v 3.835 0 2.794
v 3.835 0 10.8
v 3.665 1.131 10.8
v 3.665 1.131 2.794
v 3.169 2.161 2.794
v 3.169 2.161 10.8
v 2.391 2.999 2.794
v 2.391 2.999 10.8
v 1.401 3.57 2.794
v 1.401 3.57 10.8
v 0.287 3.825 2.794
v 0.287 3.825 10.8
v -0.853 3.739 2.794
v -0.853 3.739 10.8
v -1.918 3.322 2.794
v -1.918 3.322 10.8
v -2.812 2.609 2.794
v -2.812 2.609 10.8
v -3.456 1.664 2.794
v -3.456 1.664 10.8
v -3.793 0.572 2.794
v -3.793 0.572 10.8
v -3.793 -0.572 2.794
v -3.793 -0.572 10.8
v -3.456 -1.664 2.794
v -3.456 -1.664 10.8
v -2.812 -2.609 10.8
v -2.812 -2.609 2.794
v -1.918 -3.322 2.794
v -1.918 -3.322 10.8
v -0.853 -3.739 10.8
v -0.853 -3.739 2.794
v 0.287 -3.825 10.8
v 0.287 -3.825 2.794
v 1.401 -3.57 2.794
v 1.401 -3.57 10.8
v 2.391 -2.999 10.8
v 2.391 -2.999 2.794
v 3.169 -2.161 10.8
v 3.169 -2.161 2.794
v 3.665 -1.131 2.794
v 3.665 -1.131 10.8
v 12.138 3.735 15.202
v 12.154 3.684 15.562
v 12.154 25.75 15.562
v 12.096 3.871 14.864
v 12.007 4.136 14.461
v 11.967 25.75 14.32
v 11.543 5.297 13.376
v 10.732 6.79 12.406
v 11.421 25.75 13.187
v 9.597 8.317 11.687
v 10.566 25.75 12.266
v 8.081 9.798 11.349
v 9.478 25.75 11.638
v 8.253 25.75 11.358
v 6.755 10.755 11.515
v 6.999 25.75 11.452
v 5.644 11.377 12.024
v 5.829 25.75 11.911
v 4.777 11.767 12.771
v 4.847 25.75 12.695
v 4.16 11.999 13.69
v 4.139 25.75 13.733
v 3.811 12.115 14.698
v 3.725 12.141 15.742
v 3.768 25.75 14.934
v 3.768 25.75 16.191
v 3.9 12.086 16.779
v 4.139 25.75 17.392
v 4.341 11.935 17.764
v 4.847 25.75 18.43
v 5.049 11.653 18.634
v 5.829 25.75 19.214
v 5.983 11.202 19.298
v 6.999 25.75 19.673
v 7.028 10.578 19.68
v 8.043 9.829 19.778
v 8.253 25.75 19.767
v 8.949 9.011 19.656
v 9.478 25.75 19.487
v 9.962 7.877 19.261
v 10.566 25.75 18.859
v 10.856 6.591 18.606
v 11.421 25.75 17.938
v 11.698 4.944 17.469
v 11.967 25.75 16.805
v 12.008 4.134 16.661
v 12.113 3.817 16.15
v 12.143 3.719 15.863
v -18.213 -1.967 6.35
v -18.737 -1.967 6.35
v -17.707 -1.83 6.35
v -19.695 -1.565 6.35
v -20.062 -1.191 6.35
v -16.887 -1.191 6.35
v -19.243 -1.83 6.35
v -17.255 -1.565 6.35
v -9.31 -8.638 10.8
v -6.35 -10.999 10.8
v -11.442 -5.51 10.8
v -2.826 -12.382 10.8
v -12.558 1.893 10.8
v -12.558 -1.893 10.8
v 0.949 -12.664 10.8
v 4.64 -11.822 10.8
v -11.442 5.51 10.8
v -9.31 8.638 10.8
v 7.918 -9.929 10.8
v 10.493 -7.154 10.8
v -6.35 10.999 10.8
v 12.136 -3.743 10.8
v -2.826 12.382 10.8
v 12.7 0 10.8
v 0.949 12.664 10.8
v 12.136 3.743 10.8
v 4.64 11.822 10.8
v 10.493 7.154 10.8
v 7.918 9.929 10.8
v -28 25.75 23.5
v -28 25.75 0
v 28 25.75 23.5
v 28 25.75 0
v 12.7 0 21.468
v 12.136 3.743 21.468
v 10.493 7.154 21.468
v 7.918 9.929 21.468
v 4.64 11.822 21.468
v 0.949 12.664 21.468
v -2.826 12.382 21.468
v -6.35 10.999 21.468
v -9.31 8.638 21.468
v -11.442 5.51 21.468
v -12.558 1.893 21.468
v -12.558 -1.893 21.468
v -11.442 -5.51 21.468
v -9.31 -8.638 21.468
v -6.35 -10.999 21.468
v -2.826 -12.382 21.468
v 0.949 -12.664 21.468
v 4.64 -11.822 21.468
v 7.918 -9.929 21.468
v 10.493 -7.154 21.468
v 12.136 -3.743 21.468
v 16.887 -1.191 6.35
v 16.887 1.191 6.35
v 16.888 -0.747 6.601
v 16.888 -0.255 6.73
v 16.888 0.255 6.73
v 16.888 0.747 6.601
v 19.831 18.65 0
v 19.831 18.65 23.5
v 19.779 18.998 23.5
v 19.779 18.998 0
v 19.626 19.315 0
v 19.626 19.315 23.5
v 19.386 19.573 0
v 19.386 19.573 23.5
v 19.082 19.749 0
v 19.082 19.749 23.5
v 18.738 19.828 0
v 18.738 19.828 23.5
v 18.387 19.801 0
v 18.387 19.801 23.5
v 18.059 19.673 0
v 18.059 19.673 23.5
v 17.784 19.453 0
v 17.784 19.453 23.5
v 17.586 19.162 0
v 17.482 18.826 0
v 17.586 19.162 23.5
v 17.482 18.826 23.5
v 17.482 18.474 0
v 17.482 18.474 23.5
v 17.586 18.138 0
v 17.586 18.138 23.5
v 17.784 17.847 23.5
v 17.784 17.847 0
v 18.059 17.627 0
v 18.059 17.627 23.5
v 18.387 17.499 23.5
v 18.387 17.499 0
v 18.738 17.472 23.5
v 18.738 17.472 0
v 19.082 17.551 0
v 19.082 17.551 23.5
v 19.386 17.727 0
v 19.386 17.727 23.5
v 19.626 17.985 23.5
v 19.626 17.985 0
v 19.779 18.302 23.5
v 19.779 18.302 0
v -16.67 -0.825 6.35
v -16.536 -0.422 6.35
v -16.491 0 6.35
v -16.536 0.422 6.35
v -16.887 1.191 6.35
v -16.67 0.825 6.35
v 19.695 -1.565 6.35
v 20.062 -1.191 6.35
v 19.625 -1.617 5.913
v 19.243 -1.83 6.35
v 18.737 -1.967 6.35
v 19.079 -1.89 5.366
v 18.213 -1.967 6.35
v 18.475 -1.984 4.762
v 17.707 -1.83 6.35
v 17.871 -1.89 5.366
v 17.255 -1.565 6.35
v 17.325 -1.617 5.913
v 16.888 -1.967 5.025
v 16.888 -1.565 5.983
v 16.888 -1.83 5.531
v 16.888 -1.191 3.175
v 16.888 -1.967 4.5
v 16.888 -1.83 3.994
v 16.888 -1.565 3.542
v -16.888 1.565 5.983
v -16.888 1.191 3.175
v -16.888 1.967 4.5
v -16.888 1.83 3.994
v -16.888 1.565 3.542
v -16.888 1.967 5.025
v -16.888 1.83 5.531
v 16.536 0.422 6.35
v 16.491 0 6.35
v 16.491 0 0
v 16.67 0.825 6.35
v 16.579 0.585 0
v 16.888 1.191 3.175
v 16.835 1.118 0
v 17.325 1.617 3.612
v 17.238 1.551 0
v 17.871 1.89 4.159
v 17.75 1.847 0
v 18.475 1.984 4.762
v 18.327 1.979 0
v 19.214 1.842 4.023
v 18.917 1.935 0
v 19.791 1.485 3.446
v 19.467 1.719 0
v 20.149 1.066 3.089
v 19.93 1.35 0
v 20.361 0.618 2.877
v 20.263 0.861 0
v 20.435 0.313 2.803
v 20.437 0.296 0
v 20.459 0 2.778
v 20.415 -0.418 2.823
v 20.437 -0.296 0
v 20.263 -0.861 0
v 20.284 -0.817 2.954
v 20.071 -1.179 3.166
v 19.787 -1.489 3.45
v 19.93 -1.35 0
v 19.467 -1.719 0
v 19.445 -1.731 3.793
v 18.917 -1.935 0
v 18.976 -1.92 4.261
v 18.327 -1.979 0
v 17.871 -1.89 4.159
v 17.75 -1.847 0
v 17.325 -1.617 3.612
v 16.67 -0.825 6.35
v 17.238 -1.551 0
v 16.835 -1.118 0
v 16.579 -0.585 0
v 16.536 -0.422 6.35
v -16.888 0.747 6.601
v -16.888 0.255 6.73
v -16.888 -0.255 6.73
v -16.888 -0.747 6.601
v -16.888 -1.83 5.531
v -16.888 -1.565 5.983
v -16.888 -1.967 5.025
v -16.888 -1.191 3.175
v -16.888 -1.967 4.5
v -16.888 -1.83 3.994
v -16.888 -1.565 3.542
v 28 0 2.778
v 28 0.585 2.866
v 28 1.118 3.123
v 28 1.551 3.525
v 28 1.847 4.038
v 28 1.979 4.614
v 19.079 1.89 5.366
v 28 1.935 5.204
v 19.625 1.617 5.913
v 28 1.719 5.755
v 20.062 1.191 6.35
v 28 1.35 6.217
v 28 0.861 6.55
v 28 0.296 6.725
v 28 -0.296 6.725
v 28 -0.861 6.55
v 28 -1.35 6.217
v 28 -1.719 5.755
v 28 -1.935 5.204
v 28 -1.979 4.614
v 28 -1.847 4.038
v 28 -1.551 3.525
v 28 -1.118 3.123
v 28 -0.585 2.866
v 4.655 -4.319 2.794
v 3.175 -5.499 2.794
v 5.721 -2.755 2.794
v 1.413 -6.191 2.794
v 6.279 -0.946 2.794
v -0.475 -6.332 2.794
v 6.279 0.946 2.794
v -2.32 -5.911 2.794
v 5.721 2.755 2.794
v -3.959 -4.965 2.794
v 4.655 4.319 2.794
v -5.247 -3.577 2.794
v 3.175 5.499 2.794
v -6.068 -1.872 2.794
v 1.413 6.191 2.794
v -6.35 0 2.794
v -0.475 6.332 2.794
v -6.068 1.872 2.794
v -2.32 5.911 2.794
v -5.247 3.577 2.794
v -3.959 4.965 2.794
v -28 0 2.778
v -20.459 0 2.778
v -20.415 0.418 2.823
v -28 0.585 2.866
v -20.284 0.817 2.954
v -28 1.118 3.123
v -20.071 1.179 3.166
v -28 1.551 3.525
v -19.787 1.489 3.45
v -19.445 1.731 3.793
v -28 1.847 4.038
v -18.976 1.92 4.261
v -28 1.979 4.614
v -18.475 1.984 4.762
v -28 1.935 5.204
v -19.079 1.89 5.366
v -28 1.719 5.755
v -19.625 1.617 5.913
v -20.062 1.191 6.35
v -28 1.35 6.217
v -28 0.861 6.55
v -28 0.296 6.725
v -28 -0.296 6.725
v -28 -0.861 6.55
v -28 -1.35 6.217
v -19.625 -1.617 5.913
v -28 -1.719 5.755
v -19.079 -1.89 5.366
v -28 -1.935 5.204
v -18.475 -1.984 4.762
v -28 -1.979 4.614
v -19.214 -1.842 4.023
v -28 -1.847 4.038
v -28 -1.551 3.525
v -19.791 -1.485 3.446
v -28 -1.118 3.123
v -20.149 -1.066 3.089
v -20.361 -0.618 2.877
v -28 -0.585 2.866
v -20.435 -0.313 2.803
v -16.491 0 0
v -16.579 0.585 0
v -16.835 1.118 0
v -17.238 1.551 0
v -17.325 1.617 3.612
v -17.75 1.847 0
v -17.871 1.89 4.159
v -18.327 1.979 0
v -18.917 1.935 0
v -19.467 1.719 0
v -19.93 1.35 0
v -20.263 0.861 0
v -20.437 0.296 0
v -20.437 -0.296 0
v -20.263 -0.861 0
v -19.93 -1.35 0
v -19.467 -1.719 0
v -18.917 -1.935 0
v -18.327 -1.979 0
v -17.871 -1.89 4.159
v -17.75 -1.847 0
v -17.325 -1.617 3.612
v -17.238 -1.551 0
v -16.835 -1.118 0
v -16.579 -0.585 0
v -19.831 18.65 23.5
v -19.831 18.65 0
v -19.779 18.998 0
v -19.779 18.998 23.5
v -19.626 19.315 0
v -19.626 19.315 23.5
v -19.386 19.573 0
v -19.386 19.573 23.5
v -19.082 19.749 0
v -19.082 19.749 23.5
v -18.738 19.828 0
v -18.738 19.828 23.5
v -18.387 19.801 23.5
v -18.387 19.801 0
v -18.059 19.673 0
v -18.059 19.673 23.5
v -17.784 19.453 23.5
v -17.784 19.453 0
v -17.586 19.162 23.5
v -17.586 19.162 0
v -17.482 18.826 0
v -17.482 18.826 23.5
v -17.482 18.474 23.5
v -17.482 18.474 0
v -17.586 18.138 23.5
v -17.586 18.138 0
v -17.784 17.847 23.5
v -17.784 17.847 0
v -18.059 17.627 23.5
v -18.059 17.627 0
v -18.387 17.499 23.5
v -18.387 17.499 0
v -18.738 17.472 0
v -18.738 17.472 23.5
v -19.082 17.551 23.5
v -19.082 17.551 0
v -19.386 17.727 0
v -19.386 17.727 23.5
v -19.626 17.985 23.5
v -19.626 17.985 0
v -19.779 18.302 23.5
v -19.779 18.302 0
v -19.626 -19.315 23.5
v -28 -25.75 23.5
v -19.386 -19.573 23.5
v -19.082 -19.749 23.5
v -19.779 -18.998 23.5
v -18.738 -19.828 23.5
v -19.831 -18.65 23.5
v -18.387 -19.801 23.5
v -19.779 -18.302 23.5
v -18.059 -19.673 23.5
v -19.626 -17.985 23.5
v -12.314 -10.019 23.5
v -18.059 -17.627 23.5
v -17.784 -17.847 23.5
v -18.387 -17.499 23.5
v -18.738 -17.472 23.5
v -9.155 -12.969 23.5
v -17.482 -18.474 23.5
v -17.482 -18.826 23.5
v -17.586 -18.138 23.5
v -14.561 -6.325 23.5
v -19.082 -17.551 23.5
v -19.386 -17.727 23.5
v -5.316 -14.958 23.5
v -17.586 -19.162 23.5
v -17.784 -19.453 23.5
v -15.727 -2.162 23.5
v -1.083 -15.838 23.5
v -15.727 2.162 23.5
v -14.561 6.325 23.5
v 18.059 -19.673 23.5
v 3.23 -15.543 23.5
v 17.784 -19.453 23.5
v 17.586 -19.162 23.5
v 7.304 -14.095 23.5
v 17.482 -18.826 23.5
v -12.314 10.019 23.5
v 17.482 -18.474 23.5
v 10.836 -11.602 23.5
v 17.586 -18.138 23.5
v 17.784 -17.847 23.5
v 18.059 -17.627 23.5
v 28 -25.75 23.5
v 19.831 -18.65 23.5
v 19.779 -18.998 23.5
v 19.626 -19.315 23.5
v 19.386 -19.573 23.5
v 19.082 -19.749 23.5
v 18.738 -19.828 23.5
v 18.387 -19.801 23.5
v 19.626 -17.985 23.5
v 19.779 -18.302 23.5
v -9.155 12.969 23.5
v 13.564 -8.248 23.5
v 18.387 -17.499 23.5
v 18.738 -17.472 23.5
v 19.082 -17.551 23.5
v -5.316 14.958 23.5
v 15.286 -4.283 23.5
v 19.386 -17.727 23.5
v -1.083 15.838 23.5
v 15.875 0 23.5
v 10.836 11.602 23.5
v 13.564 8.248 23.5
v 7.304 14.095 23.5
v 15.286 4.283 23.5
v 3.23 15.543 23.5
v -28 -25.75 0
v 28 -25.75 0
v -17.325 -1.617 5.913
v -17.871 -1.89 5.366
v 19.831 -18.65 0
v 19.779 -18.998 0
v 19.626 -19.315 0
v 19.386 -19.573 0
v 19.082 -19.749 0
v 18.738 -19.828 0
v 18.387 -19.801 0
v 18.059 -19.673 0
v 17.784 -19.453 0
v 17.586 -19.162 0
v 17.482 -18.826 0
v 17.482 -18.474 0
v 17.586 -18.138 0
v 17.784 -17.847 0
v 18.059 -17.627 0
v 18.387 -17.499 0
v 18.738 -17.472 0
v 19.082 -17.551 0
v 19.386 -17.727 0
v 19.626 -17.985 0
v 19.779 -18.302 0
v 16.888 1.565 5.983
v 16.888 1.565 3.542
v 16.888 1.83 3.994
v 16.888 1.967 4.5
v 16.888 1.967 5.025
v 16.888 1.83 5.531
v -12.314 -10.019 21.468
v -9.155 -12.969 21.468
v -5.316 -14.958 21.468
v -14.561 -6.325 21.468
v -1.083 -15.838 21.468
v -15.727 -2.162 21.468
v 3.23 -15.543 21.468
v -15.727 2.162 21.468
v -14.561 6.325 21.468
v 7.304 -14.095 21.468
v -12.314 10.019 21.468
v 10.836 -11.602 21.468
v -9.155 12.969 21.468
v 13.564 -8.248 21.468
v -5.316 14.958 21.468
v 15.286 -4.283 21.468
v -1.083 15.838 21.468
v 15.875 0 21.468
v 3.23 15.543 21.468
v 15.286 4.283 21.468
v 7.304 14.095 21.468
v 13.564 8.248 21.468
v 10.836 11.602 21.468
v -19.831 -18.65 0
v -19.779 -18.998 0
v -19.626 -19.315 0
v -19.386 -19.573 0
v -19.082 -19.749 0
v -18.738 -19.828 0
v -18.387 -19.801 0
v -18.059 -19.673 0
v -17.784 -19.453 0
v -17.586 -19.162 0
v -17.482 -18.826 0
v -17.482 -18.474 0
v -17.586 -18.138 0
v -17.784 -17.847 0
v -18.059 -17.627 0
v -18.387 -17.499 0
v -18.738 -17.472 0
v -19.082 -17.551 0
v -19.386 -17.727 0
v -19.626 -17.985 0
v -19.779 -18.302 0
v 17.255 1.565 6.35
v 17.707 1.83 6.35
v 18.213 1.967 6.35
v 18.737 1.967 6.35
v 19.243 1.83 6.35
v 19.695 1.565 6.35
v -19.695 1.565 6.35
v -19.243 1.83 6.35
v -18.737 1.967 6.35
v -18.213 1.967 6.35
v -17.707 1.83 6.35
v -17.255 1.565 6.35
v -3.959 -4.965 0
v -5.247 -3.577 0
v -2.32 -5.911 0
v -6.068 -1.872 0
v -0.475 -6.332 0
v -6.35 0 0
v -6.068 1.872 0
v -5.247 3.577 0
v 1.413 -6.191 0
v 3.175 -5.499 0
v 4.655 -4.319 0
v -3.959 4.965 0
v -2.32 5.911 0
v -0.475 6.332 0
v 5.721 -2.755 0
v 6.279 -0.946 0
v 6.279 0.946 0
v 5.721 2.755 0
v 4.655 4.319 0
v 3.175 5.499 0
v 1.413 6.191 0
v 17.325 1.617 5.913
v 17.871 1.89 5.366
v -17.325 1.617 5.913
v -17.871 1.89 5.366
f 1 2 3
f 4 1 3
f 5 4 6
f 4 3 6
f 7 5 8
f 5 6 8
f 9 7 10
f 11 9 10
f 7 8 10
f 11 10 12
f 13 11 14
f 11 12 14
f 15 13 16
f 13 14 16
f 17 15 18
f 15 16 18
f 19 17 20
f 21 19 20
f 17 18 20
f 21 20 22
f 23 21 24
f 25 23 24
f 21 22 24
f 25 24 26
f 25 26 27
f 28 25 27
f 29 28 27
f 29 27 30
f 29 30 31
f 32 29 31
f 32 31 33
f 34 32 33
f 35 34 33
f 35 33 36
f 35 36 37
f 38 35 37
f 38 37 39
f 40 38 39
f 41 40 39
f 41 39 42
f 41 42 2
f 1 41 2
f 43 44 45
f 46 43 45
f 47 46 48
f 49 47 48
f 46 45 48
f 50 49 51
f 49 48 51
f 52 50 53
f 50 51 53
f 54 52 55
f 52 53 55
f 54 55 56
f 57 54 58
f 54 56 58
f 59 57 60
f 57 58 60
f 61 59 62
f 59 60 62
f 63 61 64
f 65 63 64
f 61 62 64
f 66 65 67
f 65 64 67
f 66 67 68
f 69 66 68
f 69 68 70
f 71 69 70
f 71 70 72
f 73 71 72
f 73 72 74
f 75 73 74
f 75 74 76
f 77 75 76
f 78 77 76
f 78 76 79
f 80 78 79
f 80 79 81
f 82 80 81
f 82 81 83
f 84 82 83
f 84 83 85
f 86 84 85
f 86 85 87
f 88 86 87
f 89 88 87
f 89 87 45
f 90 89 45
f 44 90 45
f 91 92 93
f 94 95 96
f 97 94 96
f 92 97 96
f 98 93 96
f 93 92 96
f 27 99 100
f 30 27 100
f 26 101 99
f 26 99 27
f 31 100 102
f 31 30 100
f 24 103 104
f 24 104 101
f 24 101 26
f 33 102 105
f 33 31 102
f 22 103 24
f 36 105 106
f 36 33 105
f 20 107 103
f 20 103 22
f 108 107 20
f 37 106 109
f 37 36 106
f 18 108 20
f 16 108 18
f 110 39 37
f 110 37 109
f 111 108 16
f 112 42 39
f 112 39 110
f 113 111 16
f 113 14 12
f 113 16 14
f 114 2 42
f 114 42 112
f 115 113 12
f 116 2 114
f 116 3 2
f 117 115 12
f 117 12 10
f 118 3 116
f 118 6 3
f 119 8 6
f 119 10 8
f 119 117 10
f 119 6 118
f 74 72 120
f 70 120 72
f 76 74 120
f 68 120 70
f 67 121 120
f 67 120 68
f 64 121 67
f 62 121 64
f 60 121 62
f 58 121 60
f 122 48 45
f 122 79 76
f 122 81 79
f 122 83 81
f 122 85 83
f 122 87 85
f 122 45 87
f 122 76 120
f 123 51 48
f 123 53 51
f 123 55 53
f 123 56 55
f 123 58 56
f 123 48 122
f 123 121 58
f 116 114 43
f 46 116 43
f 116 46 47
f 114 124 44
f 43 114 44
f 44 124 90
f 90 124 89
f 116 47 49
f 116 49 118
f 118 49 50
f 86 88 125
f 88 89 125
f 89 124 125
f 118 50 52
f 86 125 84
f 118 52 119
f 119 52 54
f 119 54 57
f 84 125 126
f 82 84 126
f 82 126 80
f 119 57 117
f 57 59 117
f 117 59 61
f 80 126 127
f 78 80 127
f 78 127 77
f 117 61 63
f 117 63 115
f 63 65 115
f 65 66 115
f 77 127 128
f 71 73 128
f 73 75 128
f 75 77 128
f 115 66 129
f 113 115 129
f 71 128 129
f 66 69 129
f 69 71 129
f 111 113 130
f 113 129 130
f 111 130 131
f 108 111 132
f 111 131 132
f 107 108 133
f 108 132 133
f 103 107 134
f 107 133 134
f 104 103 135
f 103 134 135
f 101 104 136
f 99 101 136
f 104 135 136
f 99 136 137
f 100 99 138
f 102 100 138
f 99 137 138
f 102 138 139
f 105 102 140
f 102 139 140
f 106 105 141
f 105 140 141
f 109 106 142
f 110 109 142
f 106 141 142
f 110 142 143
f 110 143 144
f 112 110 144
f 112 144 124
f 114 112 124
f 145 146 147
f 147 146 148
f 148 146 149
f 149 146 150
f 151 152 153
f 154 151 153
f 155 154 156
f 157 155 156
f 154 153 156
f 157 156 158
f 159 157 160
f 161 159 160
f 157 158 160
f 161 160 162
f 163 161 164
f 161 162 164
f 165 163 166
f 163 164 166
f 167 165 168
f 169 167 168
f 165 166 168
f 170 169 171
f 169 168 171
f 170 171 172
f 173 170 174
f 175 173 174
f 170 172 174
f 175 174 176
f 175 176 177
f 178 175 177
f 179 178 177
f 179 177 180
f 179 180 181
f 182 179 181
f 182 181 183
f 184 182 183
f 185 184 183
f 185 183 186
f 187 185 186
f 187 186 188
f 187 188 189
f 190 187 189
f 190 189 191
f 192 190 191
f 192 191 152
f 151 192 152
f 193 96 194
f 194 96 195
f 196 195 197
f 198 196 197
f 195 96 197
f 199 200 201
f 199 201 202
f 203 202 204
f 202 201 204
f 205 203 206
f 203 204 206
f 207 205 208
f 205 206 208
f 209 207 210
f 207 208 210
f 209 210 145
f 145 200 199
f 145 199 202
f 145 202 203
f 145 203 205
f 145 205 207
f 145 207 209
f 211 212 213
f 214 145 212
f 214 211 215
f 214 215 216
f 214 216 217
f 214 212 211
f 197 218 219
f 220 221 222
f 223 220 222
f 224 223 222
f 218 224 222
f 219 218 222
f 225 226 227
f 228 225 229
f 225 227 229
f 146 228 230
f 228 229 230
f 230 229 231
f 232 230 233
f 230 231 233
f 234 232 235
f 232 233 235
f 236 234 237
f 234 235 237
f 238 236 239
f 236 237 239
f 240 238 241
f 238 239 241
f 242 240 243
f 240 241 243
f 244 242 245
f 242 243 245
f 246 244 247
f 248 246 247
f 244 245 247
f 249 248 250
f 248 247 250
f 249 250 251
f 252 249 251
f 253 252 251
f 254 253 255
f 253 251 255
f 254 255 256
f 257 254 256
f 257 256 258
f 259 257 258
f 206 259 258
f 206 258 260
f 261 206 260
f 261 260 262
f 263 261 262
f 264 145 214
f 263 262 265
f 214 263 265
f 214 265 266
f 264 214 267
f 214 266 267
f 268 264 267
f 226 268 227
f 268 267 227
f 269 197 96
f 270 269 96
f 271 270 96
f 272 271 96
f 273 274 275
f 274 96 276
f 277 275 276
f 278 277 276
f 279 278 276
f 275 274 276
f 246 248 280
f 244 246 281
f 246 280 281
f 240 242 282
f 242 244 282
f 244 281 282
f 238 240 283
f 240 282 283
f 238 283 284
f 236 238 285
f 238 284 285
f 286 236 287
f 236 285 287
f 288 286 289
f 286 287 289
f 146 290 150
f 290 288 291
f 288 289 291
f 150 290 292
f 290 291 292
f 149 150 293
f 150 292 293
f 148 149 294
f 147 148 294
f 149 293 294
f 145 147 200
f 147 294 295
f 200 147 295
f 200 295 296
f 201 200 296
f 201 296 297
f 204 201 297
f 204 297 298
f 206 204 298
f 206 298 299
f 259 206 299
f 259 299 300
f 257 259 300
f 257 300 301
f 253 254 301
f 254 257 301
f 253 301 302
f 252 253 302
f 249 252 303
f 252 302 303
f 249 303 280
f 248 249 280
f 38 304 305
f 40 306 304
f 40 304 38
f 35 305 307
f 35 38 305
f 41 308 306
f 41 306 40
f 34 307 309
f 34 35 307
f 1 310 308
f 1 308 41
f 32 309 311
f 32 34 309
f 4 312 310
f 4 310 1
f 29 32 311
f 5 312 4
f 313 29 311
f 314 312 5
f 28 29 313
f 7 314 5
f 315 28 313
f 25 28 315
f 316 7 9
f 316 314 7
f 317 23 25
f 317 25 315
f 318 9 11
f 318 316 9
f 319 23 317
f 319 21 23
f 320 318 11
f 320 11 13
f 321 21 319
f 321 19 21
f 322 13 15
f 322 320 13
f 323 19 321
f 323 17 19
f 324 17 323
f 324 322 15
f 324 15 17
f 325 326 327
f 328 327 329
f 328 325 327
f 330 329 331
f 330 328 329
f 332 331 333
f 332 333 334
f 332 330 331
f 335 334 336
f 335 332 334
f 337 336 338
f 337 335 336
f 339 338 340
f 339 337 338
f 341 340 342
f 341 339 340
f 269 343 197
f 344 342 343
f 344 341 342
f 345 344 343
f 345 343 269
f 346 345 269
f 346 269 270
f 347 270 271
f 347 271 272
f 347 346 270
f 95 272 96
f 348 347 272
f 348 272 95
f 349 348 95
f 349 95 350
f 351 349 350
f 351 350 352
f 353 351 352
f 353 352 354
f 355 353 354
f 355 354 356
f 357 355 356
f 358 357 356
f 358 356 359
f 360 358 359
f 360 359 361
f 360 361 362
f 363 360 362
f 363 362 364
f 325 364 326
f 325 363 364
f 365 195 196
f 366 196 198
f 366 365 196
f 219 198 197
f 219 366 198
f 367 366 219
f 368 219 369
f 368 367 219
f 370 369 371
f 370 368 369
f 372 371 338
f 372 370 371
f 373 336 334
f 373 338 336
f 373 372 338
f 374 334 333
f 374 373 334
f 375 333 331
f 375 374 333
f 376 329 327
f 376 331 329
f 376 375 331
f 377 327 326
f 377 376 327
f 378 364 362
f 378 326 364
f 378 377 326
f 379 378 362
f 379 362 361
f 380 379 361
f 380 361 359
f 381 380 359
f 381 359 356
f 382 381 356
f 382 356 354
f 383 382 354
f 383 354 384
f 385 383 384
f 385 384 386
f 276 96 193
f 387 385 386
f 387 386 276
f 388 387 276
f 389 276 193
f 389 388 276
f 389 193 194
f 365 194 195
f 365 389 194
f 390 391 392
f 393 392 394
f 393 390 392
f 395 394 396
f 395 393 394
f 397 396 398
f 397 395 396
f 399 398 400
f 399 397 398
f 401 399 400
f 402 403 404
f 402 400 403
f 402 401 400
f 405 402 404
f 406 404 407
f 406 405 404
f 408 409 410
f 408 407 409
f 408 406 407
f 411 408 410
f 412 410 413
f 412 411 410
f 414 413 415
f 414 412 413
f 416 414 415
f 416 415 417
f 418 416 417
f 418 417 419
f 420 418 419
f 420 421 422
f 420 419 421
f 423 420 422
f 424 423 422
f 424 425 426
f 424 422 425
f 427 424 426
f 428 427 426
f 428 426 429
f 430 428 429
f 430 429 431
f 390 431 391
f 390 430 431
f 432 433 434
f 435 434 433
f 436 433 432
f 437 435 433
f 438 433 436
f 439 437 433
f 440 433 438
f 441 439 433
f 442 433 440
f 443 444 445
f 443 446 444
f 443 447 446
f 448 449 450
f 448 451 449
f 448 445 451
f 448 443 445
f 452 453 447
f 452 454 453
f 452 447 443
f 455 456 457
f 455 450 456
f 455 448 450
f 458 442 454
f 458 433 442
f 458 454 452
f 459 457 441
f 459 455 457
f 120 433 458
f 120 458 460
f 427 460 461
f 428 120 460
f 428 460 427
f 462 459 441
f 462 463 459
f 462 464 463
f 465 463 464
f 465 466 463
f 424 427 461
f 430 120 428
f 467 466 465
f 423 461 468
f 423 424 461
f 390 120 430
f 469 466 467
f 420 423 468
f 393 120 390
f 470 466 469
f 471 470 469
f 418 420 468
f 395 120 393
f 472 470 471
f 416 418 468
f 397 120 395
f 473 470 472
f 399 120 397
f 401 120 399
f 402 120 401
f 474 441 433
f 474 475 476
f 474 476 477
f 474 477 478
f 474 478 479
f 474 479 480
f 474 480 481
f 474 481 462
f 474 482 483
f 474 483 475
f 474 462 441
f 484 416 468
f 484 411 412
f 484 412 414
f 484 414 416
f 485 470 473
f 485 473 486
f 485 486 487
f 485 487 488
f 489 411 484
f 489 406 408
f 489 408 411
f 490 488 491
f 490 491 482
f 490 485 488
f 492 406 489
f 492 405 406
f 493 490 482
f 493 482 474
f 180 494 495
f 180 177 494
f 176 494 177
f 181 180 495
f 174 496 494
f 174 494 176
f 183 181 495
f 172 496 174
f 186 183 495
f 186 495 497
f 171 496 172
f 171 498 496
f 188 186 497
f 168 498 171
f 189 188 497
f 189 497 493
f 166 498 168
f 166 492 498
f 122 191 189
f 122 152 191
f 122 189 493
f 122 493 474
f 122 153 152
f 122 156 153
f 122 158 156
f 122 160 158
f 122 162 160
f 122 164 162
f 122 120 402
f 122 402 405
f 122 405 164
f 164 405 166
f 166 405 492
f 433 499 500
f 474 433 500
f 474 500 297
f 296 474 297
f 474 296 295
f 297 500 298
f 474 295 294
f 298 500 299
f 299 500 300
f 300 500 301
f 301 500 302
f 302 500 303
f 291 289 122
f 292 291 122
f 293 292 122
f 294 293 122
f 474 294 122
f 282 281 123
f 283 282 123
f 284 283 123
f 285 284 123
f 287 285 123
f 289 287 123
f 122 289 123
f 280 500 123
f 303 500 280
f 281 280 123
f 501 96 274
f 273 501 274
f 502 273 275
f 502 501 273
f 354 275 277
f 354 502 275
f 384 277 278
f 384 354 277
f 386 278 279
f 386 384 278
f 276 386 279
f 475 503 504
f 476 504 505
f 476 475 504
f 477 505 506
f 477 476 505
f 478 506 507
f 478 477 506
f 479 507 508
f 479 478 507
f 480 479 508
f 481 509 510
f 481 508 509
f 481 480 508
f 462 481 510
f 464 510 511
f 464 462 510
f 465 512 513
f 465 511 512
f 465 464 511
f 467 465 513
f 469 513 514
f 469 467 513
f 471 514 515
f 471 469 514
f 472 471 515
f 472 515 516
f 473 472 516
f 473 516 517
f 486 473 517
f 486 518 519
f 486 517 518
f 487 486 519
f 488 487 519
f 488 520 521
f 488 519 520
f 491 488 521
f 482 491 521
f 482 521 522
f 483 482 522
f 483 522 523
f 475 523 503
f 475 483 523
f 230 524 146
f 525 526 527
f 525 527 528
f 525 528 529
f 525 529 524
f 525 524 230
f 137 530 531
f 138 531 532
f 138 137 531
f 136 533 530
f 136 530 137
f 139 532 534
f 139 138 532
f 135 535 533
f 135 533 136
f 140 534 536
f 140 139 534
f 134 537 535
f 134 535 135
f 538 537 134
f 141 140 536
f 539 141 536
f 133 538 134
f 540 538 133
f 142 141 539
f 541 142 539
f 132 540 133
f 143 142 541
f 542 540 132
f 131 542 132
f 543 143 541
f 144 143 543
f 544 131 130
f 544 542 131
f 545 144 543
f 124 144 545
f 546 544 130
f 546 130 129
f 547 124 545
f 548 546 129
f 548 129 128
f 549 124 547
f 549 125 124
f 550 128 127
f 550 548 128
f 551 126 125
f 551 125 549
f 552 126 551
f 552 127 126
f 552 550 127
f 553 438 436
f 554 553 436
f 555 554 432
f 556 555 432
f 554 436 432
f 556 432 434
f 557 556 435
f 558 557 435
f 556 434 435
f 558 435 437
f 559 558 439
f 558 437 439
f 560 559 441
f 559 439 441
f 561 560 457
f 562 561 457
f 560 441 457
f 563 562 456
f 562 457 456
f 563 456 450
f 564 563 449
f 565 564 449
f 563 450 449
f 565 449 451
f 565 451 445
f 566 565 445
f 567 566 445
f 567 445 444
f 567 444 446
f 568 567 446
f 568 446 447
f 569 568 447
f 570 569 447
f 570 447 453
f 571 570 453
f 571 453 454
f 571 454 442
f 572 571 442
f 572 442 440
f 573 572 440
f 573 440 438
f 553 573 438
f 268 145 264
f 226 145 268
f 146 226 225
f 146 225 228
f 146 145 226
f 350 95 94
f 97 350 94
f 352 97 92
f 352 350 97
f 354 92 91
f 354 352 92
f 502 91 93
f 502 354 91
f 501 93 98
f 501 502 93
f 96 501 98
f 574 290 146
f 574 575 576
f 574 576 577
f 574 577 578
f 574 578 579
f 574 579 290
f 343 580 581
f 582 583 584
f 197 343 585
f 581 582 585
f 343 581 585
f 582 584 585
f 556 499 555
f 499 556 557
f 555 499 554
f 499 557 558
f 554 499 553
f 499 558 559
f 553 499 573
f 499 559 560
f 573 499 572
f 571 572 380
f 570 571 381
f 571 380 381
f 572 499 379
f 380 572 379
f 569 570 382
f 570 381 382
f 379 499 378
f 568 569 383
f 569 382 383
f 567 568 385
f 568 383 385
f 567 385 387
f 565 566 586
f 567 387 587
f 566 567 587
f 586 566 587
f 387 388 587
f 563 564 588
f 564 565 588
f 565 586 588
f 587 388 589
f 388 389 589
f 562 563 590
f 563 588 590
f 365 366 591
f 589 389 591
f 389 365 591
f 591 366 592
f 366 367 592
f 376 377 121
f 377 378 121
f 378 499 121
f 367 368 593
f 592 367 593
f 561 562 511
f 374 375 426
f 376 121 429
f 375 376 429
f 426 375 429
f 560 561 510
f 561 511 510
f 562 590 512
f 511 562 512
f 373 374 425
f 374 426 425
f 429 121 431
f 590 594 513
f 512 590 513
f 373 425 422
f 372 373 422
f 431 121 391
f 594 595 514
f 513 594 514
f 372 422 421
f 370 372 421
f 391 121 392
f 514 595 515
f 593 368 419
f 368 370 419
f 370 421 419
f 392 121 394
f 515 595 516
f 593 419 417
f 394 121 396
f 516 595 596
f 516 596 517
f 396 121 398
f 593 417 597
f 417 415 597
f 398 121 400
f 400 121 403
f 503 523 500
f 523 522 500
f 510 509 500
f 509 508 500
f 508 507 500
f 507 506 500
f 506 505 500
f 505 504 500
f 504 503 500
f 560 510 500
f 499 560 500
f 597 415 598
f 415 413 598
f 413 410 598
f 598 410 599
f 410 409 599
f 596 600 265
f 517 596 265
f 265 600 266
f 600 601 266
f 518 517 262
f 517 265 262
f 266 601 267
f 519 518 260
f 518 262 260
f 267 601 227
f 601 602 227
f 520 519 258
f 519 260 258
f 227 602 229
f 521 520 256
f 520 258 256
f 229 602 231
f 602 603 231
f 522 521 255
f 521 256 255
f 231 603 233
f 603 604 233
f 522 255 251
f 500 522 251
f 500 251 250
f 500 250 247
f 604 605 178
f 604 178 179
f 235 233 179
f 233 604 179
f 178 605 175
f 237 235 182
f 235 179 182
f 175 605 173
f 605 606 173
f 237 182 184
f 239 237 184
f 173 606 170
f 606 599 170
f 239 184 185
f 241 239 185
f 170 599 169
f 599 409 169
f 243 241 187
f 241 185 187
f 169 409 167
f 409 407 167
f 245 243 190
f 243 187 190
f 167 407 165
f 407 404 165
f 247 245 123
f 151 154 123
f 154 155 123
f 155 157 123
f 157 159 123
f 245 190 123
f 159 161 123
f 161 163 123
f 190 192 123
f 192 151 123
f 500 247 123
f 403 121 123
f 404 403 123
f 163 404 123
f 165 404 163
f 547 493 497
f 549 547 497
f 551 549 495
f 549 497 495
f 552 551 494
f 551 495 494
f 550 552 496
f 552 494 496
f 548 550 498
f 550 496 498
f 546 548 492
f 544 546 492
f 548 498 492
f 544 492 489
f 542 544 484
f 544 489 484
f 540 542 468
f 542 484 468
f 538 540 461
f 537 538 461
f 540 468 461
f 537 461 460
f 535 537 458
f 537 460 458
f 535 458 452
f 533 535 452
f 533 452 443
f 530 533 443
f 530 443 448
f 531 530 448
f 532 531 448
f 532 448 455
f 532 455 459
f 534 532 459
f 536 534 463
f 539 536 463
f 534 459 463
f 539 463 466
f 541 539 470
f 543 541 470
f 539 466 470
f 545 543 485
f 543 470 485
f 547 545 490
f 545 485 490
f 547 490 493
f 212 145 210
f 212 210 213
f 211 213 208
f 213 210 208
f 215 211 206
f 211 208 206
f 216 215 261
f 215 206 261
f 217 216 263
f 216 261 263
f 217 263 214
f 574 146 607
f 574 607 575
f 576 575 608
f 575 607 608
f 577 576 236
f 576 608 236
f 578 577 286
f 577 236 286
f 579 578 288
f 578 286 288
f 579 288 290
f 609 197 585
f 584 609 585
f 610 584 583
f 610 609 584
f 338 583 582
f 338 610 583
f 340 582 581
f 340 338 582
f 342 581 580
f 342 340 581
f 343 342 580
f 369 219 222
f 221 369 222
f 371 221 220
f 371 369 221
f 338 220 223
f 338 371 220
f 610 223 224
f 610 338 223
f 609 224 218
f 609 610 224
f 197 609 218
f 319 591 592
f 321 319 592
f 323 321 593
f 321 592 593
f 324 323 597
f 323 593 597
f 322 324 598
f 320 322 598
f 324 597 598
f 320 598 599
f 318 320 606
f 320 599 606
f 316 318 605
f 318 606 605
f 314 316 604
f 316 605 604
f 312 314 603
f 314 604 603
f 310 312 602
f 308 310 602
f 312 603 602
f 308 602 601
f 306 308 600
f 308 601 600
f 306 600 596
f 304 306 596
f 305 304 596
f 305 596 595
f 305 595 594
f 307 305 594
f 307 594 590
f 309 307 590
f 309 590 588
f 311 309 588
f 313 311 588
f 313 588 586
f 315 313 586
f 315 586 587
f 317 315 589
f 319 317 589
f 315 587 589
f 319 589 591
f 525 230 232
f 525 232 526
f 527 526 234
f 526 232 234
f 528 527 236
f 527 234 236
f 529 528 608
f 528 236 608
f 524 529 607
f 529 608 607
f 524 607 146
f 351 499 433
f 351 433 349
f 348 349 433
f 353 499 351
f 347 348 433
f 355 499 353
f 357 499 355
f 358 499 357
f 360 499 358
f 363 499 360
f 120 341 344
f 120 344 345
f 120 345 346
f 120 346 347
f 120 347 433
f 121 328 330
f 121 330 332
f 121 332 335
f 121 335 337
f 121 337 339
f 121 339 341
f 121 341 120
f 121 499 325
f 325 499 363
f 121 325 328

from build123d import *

# Parameters (mm, degrees)
SKETCH1_W               = 56
SKETCH1_H               = 51.5
BOSS_EXTRUDE1_DEPTH     = 23.5
SKETCH2_R               = 15.875
CUT_EXTRUDE1_DEPTH      = 2.032
SKETCH3_R               = 12.7
CUT_EXTRUDE2_DEPTH      = 10.668
SKETCH4_R               = 3.8354
CUT_EXTRUDE3_DEPTH      = 11.8
SKETCH5_R               = 6.35
CUT_EXTRUDE4_DEPTH      = 2.794
SKETCH6_R               = 4.2164
CUT_EXTRUDE5_DEPTH      = 25.4
SKETCH7_R               = 1.984375
CUT_EXTRUDE6_DEPTH      = 6.35
SKETCH8_R               = 1.984375
CUT_EXTRUDE7_DEPTH      = 11.1125
SKETCH9_R               = 1.1811
CUT_EXTRUDE8_DEPTH      = 24.5
MIRROR4_COPY_1_SKETCH_R = 1.1811
MIRROR4_COPY_1_DEPTH    = 24.5


with BuildPart() as part:
    # Sketch1 → Boss-Extrude1 (new body)
    with BuildSketch(Plane.XY):
        Rectangle(SKETCH1_W, SKETCH1_H)
    extrude(amount=BOSS_EXTRUDE1_DEPTH)

    # Sketch2 → Cut-Extrude1 (cut)
    with BuildSketch(Plane.XY.offset(23.5)):
        Circle(SKETCH2_R)
    extrude(amount=-CUT_EXTRUDE1_DEPTH, mode=Mode.SUBTRACT)

    # Sketch3 → Cut-Extrude2 (cut)
    with BuildSketch(Plane.XY.offset(21.468)):
        Circle(SKETCH3_R)
    extrude(amount=-CUT_EXTRUDE2_DEPTH, mode=Mode.SUBTRACT)

    # Sketch4 → Cut-Extrude3 (cut, through all)
    with BuildSketch(Plane.XY.offset(10.8)):
        Circle(SKETCH4_R)
    extrude(amount=-CUT_EXTRUDE3_DEPTH, mode=Mode.SUBTRACT)

    # Sketch5 → Cut-Extrude4 (cut)
    with BuildSketch(Plane(origin=(0, 0, 0), x_dir=(-1, 0, 0), z_dir=(0, 0, -1))):
        Circle(SKETCH5_R)
    extrude(amount=-CUT_EXTRUDE4_DEPTH, mode=Mode.SUBTRACT)

    # Sketch6 → Cut-Extrude5 (cut)
    with BuildSketch(Plane(origin=(0, 25.75, 0), x_dir=(1, 0, 0), z_dir=(0, 1, 0))):
        with Locations((7.9375, -15.5625)):
            Circle(SKETCH6_R)
    extrude(amount=-CUT_EXTRUDE5_DEPTH, mode=Mode.SUBTRACT)

    # Sketch7 → Cut-Extrude6 (cut)
    with BuildSketch(Plane(origin=(0, 0, 0), x_dir=(-1, 0, 0), z_dir=(0, 0, -1))):
        with Locations((-18.475, 0)):
            Circle(SKETCH7_R)
    cut_extrude6 = extrude(amount=-CUT_EXTRUDE6_DEPTH, mode=Mode.SUBTRACT)

    # Mirror1: Cut-Extrude6 across plane
    add(cut_extrude6.mirror(Plane(origin=(0, 0, 0), x_dir=(0, 0, 1), z_dir=(1, 0, 0))), mode=Mode.SUBTRACT)

    # Sketch8 → Cut-Extrude7 (cut)
    with BuildSketch(Plane(origin=(28, 0, 0), x_dir=(0, 0, -1), z_dir=(1, 0, 0))):
        with Locations((-4.7625, 0)):
            Circle(SKETCH8_R)
    cut_extrude7 = extrude(amount=-CUT_EXTRUDE7_DEPTH, mode=Mode.SUBTRACT)

    # Mirror2: Cut-Extrude7 across plane
    add(cut_extrude7.mirror(Plane(origin=(0, 0, 0), x_dir=(0, 0, 1), z_dir=(1, 0, 0))), mode=Mode.SUBTRACT)

    # Sketch9 → Cut-Extrude8 (cut, through all)
    with BuildSketch(Plane.XY.offset(23.5)):
        with Locations((18.65, 18.65)):
            Circle(SKETCH9_R)
    cut_extrude8 = extrude(amount=-CUT_EXTRUDE8_DEPTH, mode=Mode.SUBTRACT)

    # Mirror3: Cut-Extrude8 across plane
    add(cut_extrude8.mirror(Plane.ZX), mode=Mode.SUBTRACT)

    # Mirror4: Cut-Extrude8 across plane
    add(cut_extrude8.mirror(Plane(origin=(0, 0, 0), x_dir=(0, 0, 1), z_dir=(1, 0, 0))), mode=Mode.SUBTRACT)

    # Mirror4 copy 1 sketch → Mirror4 copy 1 (cut, through all)
    with BuildSketch(Plane(origin=(0, 0, 23.5), x_dir=(-1, 0, 0), z_dir=(0, 0, 1))):
        with Locations((18.65, 18.65)):
            Circle(MIRROR4_COPY_1_SKETCH_R)
    extrude(amount=-MIRROR4_COPY_1_DEPTH, mode=Mode.SUBTRACT)


solid = part.part
